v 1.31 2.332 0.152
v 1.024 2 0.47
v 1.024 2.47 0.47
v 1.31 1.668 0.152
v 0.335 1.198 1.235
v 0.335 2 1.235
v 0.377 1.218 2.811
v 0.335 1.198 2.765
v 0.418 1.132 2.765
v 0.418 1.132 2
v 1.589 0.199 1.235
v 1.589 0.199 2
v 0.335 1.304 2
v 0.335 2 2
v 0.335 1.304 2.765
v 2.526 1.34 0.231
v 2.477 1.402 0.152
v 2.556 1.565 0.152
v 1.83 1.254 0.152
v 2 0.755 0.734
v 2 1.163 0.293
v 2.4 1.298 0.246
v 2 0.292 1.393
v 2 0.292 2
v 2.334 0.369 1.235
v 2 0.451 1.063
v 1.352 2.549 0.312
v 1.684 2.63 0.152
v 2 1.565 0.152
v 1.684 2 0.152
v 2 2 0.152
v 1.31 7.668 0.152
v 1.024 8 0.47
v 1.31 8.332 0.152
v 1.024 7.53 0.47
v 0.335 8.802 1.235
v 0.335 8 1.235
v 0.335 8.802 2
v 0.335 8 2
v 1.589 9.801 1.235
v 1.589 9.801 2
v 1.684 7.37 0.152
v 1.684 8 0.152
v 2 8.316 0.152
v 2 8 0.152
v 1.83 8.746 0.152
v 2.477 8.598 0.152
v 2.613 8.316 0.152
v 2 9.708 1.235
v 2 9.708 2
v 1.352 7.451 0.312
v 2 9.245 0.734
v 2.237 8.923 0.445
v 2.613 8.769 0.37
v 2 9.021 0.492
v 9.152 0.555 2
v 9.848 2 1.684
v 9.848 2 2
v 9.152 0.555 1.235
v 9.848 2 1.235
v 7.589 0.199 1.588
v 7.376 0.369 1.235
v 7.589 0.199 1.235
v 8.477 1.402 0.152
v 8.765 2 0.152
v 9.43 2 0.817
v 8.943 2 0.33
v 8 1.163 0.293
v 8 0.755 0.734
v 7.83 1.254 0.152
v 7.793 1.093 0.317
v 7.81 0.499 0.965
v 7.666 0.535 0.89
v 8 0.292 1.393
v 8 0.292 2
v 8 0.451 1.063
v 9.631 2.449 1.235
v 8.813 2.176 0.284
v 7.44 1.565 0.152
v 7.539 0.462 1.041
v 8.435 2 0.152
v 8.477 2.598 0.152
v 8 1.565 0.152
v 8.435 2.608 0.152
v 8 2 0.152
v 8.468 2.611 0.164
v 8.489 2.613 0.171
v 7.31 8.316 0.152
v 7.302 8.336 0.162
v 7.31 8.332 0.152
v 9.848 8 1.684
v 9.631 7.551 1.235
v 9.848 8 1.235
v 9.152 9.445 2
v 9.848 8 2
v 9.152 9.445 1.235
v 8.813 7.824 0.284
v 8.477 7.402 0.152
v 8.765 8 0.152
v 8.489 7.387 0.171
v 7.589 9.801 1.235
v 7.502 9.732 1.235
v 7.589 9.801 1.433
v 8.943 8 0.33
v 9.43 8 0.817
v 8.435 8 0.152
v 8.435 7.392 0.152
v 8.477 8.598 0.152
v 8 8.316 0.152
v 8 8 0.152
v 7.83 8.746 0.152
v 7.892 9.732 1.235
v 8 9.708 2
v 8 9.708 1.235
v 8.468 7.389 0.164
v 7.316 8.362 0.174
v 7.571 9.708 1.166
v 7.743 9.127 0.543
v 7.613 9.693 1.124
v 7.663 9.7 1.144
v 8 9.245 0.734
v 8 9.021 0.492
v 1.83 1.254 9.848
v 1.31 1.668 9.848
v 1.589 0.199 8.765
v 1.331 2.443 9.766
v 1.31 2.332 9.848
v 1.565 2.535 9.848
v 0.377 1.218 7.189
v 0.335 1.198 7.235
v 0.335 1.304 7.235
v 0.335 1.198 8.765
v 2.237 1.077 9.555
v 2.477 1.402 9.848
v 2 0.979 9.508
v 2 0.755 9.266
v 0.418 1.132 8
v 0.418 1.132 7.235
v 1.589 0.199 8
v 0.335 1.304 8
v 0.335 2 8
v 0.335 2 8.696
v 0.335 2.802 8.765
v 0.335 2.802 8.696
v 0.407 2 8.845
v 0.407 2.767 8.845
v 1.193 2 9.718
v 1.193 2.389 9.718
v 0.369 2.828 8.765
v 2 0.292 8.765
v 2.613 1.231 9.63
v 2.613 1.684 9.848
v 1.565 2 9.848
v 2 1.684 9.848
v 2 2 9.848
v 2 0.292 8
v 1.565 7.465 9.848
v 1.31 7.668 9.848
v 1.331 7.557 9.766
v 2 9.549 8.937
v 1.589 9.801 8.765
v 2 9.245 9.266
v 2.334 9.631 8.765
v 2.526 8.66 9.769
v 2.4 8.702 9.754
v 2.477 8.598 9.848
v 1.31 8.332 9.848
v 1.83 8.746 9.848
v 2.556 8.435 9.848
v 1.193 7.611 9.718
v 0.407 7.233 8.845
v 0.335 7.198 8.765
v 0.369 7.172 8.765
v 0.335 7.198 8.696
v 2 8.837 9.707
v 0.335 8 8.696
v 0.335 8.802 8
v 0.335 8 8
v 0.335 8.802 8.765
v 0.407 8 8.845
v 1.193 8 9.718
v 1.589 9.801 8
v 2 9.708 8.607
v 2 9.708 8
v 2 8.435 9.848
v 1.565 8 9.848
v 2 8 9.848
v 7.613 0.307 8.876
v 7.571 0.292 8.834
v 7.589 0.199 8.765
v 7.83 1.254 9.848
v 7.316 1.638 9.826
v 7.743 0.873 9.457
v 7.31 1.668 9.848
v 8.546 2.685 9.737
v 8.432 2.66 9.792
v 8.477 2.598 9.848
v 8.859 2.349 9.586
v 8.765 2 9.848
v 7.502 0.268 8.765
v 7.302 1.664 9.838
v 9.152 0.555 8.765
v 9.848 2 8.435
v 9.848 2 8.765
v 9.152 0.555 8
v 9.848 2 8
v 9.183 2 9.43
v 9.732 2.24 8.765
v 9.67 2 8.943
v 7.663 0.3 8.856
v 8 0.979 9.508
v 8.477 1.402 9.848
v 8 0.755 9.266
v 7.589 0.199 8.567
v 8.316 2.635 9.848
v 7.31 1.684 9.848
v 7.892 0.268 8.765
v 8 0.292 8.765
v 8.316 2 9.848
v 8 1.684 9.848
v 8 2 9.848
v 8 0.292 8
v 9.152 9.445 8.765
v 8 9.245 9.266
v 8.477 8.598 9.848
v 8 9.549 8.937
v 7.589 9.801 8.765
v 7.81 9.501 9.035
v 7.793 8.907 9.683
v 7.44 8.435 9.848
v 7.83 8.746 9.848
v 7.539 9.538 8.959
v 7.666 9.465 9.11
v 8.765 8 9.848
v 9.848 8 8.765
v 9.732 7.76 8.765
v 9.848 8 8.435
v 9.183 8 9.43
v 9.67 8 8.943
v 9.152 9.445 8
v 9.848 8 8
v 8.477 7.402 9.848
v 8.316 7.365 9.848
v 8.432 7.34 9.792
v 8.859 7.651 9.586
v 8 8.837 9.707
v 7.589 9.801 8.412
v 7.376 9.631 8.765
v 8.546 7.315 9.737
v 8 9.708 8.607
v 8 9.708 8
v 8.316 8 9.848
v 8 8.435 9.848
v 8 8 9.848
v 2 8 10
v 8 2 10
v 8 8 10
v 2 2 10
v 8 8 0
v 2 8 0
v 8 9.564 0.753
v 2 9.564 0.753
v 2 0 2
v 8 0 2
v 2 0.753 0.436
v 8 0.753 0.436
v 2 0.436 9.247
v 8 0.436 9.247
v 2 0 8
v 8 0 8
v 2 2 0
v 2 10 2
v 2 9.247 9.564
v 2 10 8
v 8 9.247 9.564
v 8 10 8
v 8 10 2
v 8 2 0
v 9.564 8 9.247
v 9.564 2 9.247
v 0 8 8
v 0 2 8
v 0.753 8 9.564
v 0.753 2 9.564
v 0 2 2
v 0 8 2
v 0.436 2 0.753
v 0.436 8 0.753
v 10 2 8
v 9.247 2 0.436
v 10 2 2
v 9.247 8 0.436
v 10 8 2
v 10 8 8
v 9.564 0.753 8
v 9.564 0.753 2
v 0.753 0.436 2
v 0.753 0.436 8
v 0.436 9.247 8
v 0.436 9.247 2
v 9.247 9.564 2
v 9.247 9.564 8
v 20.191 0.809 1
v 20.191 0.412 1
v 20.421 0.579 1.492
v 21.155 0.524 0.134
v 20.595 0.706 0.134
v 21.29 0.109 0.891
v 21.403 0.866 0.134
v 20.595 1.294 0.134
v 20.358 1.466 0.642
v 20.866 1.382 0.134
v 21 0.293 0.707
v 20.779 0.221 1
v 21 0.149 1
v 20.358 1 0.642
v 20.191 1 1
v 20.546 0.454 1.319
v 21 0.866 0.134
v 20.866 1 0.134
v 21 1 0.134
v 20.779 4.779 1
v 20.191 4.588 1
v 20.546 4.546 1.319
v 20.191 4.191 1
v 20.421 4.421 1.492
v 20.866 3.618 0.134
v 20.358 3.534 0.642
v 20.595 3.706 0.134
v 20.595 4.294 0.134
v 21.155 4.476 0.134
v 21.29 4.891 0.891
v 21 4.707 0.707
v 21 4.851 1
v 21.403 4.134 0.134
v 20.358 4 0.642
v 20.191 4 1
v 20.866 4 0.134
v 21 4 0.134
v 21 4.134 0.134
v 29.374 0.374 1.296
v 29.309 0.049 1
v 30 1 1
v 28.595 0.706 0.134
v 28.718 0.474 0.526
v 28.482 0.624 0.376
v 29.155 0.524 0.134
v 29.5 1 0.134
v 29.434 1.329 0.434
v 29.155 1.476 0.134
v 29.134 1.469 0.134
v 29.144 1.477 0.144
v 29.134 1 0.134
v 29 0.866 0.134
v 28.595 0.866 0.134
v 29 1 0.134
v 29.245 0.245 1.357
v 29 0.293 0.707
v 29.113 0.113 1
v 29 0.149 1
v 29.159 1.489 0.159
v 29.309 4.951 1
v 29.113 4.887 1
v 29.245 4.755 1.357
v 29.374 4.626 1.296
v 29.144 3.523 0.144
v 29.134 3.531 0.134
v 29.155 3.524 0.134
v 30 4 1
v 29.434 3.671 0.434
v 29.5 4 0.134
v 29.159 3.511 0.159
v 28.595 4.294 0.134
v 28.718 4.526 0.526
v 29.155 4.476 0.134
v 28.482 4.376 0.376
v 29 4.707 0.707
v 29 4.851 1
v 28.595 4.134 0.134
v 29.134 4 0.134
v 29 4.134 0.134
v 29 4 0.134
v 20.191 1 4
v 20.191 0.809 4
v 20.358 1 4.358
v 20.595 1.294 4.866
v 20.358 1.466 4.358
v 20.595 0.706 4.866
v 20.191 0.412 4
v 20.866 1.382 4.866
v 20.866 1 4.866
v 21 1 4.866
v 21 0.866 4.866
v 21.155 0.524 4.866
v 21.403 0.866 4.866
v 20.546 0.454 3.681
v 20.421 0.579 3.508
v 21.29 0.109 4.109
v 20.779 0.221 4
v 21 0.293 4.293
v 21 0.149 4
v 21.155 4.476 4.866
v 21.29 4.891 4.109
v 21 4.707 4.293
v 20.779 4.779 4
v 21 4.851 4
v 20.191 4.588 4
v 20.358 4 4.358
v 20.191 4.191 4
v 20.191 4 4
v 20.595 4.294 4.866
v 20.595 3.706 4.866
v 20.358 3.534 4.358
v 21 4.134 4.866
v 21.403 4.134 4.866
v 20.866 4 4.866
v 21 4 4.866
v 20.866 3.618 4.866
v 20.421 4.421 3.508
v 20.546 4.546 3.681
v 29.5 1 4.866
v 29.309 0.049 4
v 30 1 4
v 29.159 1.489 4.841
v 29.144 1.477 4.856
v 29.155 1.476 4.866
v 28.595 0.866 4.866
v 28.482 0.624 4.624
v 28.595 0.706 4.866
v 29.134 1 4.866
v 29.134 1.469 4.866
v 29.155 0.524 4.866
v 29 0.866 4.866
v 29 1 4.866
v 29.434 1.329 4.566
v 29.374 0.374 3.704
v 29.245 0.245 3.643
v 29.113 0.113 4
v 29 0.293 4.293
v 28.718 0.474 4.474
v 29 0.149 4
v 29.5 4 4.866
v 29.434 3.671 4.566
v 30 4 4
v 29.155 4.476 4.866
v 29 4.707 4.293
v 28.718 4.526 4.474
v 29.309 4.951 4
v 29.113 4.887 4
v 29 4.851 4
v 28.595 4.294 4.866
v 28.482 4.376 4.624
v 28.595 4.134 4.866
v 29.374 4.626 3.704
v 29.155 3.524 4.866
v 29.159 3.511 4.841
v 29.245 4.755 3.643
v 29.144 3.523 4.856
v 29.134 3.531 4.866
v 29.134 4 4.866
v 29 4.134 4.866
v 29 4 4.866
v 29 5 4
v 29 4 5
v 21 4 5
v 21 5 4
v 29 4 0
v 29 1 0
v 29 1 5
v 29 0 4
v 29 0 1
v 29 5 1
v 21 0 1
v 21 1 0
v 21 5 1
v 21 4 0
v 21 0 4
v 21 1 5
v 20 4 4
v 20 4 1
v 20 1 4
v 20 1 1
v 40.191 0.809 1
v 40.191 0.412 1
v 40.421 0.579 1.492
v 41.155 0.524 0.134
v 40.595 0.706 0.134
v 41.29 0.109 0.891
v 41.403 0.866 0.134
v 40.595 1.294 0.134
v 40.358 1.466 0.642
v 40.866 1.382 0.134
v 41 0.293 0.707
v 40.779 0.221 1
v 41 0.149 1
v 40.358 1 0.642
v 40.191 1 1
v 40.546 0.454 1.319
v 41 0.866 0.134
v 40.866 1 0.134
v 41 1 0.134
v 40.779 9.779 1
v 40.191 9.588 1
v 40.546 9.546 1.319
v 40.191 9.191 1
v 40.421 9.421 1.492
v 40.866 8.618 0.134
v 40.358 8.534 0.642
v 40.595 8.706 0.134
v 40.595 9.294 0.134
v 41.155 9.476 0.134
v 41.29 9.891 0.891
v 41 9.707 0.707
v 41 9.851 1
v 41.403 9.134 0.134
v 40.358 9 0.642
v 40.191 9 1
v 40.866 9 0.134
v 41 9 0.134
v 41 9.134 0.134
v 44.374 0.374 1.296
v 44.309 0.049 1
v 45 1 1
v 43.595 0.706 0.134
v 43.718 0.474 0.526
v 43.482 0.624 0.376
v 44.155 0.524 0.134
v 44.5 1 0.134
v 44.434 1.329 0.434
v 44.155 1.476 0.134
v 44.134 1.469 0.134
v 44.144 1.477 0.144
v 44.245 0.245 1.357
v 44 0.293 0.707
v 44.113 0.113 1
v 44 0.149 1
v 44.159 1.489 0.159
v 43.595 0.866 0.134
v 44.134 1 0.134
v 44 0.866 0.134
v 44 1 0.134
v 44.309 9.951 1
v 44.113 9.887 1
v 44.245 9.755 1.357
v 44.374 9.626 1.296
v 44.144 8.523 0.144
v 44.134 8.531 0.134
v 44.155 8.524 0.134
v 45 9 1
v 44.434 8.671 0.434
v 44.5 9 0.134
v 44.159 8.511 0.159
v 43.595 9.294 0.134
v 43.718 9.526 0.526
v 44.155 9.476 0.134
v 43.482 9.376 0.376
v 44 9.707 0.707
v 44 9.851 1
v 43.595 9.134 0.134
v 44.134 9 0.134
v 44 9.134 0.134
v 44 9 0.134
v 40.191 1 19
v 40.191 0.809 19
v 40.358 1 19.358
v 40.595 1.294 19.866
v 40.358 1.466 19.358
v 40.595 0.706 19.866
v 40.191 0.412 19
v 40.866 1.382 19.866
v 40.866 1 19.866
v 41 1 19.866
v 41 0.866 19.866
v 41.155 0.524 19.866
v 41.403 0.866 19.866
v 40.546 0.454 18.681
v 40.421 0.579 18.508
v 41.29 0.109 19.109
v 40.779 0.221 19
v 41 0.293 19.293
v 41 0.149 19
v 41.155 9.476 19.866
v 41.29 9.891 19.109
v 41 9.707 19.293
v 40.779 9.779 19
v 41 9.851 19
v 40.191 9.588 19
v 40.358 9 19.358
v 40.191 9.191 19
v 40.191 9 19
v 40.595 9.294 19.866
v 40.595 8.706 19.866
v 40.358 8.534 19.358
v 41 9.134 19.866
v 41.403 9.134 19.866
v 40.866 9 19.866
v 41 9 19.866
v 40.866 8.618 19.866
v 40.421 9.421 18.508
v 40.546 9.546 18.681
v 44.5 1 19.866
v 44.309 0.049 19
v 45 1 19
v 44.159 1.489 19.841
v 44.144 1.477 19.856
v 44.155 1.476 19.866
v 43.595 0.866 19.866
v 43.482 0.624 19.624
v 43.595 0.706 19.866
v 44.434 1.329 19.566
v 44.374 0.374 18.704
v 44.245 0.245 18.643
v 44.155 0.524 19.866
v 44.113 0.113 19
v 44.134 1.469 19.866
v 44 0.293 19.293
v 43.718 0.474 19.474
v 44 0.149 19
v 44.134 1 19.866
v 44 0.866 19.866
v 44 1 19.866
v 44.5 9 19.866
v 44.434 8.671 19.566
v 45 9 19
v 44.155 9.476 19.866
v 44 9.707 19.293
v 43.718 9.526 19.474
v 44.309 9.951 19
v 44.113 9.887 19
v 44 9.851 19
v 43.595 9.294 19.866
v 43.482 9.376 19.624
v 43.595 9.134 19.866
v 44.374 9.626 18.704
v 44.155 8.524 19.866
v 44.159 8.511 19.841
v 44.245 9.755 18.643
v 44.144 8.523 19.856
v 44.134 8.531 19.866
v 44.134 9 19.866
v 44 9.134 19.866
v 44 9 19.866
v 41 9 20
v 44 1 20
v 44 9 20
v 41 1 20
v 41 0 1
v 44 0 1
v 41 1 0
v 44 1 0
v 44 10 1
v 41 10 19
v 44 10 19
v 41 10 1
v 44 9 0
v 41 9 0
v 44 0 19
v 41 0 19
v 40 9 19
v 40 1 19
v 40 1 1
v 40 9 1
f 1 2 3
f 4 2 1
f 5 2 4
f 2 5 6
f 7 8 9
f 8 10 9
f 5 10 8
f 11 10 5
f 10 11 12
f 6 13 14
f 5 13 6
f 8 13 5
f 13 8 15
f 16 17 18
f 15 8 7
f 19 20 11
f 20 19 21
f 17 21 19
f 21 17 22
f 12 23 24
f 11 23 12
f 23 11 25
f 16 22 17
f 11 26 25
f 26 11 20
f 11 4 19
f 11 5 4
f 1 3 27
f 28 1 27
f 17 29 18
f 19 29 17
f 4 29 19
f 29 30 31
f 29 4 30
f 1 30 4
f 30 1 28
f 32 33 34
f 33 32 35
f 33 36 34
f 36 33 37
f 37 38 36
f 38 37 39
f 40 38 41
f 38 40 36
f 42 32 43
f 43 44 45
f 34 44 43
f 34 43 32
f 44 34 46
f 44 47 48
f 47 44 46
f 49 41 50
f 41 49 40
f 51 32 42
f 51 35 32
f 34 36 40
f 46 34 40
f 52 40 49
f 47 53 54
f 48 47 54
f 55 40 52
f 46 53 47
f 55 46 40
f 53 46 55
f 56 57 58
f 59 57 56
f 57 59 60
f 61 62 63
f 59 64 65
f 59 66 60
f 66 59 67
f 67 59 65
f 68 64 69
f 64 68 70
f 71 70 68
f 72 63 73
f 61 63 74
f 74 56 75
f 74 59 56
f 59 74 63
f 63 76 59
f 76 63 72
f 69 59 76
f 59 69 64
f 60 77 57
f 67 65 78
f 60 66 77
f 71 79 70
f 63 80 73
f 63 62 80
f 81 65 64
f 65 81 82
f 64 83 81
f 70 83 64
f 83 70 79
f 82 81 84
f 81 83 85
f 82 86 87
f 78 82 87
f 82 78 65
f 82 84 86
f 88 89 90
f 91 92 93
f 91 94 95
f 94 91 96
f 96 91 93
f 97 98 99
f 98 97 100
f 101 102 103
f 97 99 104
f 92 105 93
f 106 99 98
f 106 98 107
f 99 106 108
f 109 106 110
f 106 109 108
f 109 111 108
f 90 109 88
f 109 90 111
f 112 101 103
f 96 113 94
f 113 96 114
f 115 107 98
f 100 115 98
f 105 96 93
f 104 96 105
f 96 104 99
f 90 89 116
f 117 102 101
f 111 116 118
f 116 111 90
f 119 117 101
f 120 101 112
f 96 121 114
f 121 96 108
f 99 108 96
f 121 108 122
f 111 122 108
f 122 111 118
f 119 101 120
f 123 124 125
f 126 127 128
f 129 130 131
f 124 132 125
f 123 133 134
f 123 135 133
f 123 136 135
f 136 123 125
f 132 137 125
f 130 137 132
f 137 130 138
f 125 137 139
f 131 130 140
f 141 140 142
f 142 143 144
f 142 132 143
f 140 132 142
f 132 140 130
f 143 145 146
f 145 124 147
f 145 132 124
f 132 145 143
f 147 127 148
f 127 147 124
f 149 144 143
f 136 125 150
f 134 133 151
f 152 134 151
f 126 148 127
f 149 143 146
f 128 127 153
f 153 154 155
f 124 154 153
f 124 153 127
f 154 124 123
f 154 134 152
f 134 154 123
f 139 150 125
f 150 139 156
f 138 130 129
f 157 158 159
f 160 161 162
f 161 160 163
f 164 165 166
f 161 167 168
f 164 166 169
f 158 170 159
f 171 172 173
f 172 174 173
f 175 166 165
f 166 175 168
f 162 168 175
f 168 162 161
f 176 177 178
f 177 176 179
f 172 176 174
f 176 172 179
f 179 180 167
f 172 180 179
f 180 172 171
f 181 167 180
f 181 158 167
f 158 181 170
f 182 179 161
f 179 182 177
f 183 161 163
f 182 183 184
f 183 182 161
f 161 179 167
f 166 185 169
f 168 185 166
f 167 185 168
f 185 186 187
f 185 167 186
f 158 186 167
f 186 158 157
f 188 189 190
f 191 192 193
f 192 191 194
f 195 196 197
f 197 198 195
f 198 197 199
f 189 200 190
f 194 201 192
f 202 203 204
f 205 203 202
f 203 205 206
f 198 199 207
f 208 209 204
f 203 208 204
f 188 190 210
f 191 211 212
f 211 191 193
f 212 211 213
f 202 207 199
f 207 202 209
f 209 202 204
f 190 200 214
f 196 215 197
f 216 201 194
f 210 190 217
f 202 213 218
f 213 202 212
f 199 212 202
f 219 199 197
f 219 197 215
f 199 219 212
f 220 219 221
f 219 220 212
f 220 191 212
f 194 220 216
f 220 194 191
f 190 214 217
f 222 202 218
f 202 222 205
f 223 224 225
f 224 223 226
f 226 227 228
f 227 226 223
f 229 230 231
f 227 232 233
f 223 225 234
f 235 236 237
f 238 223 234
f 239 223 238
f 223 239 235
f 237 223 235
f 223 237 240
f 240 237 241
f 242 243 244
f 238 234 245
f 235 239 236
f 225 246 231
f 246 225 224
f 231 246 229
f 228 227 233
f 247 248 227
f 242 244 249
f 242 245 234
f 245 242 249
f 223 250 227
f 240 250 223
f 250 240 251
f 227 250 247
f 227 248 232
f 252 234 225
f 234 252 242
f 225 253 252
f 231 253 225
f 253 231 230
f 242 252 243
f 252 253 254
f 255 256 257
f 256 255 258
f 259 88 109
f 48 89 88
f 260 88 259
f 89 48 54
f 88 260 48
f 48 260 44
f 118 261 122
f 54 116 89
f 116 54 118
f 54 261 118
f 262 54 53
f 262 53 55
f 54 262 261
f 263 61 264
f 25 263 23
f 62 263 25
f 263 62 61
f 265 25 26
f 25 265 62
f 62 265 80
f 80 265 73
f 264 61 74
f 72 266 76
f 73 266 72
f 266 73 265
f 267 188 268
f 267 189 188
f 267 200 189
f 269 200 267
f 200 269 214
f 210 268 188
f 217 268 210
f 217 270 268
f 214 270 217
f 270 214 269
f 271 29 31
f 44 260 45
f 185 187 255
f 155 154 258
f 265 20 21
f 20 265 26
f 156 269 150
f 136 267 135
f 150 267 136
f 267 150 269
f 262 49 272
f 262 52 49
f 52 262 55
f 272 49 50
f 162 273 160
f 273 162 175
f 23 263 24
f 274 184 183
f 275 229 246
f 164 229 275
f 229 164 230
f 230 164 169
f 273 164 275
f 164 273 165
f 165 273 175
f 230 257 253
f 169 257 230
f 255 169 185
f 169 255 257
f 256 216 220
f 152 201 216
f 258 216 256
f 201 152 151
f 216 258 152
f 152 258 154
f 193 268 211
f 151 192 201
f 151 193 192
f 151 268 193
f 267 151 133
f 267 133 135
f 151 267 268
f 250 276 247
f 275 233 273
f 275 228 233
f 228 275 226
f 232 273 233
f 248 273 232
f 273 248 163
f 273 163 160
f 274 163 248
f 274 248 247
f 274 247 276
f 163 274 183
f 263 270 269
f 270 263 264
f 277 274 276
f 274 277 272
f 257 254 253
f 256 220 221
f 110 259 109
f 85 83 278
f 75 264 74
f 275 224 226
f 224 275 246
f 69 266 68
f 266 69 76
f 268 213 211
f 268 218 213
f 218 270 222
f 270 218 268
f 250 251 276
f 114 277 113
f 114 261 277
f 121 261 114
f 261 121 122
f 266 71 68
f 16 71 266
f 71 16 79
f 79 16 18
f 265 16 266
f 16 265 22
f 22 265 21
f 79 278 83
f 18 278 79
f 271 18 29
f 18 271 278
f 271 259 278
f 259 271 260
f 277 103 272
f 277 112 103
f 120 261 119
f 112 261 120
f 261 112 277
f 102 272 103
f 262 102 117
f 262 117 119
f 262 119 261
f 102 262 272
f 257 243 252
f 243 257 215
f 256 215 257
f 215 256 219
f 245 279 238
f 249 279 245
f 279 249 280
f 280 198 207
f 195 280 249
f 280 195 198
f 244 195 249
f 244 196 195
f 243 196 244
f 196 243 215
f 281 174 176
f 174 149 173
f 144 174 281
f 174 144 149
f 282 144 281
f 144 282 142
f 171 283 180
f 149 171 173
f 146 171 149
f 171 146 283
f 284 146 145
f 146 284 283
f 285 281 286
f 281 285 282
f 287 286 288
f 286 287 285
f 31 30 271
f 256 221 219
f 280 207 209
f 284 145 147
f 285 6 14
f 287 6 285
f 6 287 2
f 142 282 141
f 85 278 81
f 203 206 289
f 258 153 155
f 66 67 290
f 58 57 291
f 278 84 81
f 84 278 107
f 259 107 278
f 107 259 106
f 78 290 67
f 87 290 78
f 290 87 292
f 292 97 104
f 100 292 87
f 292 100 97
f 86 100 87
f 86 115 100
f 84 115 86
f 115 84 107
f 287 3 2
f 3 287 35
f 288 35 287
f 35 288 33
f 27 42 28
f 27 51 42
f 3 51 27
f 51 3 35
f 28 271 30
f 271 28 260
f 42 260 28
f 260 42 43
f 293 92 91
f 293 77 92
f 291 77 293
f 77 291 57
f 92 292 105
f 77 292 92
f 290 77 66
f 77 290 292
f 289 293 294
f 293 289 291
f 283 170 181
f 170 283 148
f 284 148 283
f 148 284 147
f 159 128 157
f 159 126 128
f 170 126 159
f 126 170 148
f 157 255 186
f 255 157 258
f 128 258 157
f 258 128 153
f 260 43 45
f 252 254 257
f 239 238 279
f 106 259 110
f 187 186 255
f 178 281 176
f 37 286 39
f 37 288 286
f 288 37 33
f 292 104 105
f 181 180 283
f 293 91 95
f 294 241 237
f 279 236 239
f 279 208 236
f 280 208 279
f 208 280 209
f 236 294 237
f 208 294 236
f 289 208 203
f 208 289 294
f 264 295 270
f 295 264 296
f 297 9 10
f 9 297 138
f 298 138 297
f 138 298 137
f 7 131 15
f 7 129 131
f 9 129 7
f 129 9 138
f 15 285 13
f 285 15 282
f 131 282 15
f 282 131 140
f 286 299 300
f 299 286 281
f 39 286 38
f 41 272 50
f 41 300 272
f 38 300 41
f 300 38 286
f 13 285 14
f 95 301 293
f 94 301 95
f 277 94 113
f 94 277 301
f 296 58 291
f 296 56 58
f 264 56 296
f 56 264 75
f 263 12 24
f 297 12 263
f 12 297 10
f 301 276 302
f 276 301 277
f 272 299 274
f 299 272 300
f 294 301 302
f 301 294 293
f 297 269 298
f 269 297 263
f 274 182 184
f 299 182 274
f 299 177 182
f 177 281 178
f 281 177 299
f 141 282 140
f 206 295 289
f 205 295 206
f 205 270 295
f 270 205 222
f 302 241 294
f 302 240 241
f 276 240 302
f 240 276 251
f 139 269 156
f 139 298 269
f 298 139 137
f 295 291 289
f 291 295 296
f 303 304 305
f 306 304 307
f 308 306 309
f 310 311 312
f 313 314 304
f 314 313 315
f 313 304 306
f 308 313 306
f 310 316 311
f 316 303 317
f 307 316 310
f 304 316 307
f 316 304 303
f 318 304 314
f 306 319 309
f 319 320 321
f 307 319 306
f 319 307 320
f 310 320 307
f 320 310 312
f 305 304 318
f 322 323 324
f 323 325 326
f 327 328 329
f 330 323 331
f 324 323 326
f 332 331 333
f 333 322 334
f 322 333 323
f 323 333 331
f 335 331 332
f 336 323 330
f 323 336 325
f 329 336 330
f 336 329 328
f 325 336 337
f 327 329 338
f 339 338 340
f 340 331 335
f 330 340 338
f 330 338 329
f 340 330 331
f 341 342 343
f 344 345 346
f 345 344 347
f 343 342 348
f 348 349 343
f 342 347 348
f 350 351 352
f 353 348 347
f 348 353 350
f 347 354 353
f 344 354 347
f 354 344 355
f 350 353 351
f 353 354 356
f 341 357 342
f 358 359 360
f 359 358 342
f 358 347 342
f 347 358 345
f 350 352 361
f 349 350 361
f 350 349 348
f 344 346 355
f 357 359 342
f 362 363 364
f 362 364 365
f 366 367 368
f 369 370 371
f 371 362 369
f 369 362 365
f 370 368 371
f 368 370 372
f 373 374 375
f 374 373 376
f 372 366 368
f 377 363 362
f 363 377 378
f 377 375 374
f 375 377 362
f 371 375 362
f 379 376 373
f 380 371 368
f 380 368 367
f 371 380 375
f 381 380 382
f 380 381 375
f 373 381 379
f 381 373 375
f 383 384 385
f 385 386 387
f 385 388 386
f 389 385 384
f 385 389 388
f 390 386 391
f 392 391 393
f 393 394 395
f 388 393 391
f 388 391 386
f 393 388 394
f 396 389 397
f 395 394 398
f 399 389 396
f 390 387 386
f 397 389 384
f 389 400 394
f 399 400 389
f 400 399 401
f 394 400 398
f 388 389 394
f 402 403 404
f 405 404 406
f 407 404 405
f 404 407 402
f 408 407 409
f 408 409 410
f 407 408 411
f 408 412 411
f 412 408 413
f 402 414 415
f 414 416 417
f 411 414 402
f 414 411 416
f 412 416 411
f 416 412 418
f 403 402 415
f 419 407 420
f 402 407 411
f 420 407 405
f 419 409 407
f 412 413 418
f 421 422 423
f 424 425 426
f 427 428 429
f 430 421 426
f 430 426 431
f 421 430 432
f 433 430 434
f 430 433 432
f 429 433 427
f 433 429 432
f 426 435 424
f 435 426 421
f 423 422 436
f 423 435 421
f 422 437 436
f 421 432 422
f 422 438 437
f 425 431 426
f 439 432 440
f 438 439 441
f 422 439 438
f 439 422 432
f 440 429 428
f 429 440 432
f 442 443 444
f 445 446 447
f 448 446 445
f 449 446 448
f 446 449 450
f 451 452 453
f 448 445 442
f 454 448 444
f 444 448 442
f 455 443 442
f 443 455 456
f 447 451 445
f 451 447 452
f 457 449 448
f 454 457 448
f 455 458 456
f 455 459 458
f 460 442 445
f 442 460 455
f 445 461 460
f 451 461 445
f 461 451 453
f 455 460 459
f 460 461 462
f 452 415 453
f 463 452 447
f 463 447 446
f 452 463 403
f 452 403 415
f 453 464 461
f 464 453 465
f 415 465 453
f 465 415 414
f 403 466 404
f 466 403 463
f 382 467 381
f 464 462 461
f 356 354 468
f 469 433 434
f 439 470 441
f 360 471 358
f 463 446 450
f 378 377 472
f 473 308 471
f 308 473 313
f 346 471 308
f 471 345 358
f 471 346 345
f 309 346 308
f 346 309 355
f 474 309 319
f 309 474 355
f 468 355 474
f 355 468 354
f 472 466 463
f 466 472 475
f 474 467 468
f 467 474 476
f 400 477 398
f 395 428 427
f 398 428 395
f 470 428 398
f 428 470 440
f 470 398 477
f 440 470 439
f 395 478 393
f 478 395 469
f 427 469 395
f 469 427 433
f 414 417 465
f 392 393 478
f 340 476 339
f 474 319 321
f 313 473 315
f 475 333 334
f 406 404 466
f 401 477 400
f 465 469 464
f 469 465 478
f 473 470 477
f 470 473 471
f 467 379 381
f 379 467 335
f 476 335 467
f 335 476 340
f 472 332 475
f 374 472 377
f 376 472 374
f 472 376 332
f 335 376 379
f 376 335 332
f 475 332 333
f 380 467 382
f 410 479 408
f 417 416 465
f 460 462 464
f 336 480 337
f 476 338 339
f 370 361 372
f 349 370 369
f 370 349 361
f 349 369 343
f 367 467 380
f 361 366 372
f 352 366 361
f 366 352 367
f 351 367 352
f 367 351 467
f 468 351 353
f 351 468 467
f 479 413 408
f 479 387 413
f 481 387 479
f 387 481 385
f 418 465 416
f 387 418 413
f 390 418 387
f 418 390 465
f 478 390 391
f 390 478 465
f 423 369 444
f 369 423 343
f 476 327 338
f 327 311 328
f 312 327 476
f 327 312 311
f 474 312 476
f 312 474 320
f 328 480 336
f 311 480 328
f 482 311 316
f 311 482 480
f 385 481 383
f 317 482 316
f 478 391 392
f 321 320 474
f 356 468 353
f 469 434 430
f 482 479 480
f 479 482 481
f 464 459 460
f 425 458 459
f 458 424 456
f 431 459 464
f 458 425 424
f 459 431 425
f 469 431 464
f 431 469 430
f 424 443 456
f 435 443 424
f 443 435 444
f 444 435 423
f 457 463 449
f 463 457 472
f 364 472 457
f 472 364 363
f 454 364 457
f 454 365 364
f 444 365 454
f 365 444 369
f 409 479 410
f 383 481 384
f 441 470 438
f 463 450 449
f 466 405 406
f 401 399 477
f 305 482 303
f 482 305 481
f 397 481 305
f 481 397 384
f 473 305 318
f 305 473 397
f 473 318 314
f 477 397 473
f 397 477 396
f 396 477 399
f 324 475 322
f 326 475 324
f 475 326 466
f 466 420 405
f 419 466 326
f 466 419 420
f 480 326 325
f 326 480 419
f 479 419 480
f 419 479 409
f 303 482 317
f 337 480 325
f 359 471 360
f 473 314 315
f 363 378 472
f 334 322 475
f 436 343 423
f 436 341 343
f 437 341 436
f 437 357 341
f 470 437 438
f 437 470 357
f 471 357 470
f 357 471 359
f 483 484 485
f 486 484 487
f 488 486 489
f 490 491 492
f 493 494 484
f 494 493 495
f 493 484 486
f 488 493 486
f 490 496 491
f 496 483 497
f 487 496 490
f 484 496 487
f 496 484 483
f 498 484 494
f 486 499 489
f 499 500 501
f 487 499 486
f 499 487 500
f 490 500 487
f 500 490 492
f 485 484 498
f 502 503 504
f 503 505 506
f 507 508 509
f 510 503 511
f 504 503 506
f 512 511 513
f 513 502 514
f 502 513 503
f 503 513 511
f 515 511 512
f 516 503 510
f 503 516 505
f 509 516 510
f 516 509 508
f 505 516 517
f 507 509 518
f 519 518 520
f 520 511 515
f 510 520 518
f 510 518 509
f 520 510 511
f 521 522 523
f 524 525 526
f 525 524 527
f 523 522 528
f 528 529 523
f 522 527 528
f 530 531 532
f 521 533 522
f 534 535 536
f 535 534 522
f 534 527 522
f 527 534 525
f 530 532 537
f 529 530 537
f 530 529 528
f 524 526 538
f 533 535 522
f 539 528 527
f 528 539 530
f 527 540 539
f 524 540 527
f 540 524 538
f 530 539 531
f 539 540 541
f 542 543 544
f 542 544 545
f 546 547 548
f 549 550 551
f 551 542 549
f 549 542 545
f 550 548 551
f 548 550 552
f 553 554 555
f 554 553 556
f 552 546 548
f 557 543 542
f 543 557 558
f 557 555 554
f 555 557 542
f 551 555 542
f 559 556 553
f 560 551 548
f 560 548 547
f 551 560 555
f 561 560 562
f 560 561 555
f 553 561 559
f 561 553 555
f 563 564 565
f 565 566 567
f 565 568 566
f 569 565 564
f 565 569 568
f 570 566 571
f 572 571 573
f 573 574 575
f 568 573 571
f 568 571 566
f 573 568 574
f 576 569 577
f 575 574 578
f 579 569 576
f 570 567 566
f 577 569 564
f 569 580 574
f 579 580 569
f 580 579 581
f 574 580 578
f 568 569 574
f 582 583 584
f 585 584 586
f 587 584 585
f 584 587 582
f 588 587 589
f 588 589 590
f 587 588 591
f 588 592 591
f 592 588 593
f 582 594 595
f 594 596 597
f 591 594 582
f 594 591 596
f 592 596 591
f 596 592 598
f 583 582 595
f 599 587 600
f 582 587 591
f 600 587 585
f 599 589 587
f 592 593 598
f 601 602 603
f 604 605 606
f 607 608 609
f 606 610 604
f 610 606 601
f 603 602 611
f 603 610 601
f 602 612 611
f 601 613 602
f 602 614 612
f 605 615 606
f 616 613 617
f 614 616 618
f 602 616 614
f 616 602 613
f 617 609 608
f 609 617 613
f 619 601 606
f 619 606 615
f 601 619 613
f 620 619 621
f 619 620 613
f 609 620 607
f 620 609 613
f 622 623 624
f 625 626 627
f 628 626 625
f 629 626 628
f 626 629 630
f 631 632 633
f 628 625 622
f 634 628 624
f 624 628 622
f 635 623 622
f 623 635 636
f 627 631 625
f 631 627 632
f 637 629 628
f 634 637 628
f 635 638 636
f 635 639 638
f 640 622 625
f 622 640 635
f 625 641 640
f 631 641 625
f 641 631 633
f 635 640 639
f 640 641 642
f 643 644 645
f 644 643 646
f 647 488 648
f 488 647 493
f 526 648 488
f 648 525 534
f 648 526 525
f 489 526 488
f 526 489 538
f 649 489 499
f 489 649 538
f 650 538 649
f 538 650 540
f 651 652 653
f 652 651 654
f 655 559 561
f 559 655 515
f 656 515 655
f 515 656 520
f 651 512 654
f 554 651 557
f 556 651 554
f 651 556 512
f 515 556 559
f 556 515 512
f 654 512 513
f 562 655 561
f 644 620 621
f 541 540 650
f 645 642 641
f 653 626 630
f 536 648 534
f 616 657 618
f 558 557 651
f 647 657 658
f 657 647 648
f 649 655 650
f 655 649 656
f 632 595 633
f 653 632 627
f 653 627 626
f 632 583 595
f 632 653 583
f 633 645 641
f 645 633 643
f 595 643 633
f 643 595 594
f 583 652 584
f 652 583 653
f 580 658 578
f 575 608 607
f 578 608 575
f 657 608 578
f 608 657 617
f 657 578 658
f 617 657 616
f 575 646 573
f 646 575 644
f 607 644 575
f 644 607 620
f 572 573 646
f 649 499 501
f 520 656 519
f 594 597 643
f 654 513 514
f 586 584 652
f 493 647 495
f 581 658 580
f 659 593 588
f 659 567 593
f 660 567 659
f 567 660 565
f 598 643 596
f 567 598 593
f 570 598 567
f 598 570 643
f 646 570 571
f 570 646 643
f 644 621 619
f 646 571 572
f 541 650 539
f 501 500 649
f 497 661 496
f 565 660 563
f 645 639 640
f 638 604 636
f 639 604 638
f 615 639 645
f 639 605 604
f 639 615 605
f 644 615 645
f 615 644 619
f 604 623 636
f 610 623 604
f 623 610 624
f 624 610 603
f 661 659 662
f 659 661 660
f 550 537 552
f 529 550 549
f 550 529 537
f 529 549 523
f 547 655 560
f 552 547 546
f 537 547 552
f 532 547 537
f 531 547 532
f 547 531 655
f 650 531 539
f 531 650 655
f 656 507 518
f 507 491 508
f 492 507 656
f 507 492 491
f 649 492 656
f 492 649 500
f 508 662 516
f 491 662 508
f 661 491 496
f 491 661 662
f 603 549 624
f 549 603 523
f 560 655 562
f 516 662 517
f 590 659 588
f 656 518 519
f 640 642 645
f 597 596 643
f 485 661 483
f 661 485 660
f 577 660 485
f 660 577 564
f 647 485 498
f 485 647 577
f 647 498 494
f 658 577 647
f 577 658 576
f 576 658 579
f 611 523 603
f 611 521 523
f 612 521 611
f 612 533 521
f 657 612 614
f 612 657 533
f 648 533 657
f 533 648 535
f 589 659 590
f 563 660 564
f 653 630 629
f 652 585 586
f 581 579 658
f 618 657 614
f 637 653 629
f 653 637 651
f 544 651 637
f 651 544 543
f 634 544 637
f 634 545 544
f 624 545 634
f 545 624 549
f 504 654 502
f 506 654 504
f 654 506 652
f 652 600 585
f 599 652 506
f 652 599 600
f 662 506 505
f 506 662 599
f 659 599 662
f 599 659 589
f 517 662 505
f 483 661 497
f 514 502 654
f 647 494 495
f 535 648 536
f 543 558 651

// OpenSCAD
//
//    Rounded cube without minkowski
// lib/rcube.scad (https://github.com/RichardBernards/openscad/)
//
// Copyright Richard Bernards
//
// LICENSE: CC BY-NC 4.0
// This work is licensed under the Creative Commons Attribution-NonCommercial 4.0 International License.
// To view a copy of this license, visit <http://creativecommons.org/licenses/by-nc/4.0/>
// or send a letter to Creative Commons, PO Box 1866, Mountain View, CA 94042, USA.
//
//  [Usage]
//      use <rcube.scad>
//      rcube([100,50,50],5);
//
//  [Parameters] (parameter names are optional)
//      size    Array of dimensions; [width, depth, height]
//      radius  Radius for filleting the edges of the cube in mm
//
//  [Example]
//      rcube();
//      rcube([100,50,50],5);
//      rcube(size=[100,50,50], radius=5);
//
//  [Version history]
//      v1.0.0    2025-10-15    Release version
//

rcube();
translate([20,0,0]) rcube([10,5,5],1);
translate([40,0,0]) rcube(size=[5,10,20], radius=1);


module rcube(size=[10,10,10], radius=2) {
  assert( ((0.5*size[0]) > radius), "Width must not be larger than twice the radius" );
  assert( ((0.5*size[1]) > radius), "Depth must not be larger than twice the radius" );
  assert( ((0.5*size[2]) > radius), "Height must not be larger than twice the radius" );

  diameter = (2*radius);
  module __rsquare(_size=[10,10], _radius=2) {
    offset(r=_radius) { offset(delta=-_radius) { square([_size[0],_size[1]]); }}
  }
  
  union() {
    translate([radius,0,0]) rotate([90,0,90]) linear_extrude(size[0]-diameter) __rsquare([size[1],size[2]],radius); //X
    translate([0,radius,0]) rotate([-90,0,0]) linear_extrude(size[1]-diameter) translate([0,-size[2],0]) __rsquare([size[0],size[2]],radius); //Y
    translate([0,0,radius]) linear_extrude(size[2]-diameter) __rsquare([size[0],size[1]],radius); //Z
    for(zPosF = [0:1]) { for(xPosF = [0:1]) { for(yPosF = [0:1]) {
      translate([(radius+(xPosF*(size[0]-diameter))),(radius+(yPosF*(size[1]-diameter))),(radius+(zPosF*(size[2]-diameter)))]) sphere(r=radius);
    }}}
  }
}
